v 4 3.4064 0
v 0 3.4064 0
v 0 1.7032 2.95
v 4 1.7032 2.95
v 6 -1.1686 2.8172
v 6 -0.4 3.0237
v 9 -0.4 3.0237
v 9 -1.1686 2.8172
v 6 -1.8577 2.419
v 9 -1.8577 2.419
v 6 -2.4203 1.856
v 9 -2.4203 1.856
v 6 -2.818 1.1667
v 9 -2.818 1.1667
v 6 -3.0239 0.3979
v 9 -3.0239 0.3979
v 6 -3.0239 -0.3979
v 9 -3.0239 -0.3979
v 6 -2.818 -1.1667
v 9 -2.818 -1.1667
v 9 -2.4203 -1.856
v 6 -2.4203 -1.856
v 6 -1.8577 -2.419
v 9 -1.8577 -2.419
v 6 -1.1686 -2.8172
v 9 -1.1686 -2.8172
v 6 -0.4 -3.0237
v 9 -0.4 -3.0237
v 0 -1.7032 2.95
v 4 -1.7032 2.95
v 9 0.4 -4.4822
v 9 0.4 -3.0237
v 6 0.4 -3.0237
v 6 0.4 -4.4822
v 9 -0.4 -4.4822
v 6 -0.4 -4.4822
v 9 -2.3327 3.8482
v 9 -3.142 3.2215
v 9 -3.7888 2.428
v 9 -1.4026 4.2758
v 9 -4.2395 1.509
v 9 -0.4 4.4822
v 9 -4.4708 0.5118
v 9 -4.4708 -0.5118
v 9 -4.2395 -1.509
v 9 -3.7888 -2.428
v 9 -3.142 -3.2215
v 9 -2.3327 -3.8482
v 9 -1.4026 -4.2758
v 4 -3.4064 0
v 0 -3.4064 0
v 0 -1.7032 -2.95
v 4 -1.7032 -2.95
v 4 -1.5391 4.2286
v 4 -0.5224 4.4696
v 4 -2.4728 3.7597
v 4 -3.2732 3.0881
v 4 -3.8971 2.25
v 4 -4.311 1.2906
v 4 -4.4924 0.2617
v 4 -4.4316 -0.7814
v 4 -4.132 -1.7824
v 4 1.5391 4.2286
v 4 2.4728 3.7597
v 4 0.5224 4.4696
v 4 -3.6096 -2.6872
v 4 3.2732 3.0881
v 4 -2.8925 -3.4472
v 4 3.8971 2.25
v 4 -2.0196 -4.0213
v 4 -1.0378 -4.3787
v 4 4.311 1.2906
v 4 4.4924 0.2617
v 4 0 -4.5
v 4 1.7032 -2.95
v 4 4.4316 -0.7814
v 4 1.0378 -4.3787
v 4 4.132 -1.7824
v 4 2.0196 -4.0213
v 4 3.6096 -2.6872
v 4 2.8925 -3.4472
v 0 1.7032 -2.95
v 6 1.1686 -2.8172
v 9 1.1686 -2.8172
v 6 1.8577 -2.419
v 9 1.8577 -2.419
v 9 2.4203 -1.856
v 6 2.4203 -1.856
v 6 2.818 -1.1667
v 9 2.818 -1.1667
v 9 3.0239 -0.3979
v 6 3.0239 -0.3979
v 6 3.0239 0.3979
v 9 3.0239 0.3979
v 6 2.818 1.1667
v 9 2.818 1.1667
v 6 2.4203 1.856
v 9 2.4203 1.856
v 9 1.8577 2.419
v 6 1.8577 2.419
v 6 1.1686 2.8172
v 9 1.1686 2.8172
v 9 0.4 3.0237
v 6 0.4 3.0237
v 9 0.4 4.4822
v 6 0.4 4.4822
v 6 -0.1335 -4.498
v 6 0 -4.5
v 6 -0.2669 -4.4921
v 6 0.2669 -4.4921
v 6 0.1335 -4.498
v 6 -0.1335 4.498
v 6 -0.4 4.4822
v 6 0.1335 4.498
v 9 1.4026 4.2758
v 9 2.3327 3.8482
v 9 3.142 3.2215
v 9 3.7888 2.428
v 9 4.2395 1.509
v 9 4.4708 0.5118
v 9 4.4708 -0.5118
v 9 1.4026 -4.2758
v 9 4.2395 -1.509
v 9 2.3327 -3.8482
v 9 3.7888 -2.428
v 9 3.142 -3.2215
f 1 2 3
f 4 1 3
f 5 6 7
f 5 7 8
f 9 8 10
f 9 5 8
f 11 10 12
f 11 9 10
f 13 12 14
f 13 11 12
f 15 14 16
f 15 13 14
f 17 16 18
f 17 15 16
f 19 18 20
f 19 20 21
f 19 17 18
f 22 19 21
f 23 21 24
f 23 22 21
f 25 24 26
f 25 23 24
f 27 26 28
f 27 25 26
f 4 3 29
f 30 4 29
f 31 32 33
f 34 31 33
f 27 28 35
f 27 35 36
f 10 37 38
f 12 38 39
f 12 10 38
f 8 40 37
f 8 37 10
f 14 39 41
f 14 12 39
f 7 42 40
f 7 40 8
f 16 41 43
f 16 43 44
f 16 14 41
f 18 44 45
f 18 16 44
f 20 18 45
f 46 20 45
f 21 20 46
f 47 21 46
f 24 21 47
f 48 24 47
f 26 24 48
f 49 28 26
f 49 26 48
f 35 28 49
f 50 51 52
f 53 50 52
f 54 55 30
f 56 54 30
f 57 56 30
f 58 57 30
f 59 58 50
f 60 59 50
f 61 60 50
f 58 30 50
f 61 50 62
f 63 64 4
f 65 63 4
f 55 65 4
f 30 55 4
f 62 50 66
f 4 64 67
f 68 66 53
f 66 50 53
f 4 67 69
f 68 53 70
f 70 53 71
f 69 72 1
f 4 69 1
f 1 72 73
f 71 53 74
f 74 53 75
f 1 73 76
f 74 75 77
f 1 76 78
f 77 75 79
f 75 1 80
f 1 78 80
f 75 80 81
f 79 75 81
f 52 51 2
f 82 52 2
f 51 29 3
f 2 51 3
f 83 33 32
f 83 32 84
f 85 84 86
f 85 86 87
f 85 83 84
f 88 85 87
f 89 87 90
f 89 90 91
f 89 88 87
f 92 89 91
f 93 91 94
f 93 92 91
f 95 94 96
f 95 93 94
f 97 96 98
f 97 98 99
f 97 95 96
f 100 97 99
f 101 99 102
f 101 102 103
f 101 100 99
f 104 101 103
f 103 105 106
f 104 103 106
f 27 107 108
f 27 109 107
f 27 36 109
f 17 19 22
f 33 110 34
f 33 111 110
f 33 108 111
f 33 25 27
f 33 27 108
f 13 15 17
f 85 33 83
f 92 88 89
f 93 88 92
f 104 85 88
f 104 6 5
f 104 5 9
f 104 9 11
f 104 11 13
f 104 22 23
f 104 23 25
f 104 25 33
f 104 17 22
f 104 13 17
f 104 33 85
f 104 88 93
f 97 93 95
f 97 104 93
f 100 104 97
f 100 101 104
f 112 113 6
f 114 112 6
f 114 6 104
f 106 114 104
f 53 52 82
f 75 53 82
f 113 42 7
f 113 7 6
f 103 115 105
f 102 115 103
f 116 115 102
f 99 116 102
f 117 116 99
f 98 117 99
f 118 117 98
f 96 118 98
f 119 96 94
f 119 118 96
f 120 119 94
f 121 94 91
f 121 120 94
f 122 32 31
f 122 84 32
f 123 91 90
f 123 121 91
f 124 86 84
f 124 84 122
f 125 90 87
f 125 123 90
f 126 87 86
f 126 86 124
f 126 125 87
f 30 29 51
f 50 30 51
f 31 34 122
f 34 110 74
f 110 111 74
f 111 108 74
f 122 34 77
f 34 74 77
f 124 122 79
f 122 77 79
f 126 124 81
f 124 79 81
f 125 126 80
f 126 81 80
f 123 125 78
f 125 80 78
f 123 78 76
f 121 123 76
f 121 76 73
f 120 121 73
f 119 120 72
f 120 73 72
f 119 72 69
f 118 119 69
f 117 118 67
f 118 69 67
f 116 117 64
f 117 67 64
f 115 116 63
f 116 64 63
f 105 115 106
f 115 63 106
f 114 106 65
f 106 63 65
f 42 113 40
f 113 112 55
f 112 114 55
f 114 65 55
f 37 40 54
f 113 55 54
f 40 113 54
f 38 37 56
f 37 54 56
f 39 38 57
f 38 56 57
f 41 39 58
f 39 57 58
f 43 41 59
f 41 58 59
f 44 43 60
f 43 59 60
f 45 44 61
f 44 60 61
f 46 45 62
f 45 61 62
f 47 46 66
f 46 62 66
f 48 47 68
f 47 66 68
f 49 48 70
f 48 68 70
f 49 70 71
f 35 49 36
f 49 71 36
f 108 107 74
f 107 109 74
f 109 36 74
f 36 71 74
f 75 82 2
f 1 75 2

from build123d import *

# Parameters (mm, degrees)
BOSS_EXTRUDE1_DEPTH = 4
SKETCH2_R           = 4.5
BOSS_EXTRUDE2_DEPTH = 2
SKETCH3_R           = 4.5
SKETCH3_R_2         = 3.05
BOSS_EXTRUDE3_DEPTH = 3
SKETCH4_W           = 0.8
SKETCH4_H           = 3
CUT_EXTRUDE1_DEPTH  = 5


with BuildPart() as part:
    # Sketch1 → Boss-Extrude1 (new body)
    with BuildSketch(Plane.YZ):
        Polygon((1.703183294, -2.95), (3.406366588, 0), (1.703183294, 2.95), (-1.703183294, 2.95), (-3.406366588, 0), (-1.703183294, -2.95), align=None)
    extrude(amount=BOSS_EXTRUDE1_DEPTH)

    # Sketch2 → Boss-Extrude2 (add)
    with BuildSketch(Plane.YZ.offset(4)):
        with Locations(Location((0, 0, 0), (0, 0, 270))):
            Circle(SKETCH2_R)
    extrude(amount=BOSS_EXTRUDE2_DEPTH)

    # Sketch3 → Boss-Extrude3 (add)
    with BuildSketch(Plane.YZ.offset(6)):
        with Locations(Location((0, 0, 0), (0, 0, 270))):
            Circle(SKETCH3_R)
        with Locations(Location((0, 0, 0), (0, 0, 270))):
            Circle(SKETCH3_R_2, mode=Mode.SUBTRACT)
    extrude(amount=BOSS_EXTRUDE3_DEPTH)

    # Sketch4 → Cut-Extrude1 (cut, symmetric)
    with BuildSketch(Plane(origin=(0, 0, 0), x_dir=(0, 1, 0), z_dir=(0, 0, 1))):
        with Locations((0, -7.5)):
            Rectangle(SKETCH4_W, SKETCH4_H)
    extrude(amount=CUT_EXTRUDE1_DEPTH, both=True, mode=Mode.SUBTRACT)


solid = part.part
